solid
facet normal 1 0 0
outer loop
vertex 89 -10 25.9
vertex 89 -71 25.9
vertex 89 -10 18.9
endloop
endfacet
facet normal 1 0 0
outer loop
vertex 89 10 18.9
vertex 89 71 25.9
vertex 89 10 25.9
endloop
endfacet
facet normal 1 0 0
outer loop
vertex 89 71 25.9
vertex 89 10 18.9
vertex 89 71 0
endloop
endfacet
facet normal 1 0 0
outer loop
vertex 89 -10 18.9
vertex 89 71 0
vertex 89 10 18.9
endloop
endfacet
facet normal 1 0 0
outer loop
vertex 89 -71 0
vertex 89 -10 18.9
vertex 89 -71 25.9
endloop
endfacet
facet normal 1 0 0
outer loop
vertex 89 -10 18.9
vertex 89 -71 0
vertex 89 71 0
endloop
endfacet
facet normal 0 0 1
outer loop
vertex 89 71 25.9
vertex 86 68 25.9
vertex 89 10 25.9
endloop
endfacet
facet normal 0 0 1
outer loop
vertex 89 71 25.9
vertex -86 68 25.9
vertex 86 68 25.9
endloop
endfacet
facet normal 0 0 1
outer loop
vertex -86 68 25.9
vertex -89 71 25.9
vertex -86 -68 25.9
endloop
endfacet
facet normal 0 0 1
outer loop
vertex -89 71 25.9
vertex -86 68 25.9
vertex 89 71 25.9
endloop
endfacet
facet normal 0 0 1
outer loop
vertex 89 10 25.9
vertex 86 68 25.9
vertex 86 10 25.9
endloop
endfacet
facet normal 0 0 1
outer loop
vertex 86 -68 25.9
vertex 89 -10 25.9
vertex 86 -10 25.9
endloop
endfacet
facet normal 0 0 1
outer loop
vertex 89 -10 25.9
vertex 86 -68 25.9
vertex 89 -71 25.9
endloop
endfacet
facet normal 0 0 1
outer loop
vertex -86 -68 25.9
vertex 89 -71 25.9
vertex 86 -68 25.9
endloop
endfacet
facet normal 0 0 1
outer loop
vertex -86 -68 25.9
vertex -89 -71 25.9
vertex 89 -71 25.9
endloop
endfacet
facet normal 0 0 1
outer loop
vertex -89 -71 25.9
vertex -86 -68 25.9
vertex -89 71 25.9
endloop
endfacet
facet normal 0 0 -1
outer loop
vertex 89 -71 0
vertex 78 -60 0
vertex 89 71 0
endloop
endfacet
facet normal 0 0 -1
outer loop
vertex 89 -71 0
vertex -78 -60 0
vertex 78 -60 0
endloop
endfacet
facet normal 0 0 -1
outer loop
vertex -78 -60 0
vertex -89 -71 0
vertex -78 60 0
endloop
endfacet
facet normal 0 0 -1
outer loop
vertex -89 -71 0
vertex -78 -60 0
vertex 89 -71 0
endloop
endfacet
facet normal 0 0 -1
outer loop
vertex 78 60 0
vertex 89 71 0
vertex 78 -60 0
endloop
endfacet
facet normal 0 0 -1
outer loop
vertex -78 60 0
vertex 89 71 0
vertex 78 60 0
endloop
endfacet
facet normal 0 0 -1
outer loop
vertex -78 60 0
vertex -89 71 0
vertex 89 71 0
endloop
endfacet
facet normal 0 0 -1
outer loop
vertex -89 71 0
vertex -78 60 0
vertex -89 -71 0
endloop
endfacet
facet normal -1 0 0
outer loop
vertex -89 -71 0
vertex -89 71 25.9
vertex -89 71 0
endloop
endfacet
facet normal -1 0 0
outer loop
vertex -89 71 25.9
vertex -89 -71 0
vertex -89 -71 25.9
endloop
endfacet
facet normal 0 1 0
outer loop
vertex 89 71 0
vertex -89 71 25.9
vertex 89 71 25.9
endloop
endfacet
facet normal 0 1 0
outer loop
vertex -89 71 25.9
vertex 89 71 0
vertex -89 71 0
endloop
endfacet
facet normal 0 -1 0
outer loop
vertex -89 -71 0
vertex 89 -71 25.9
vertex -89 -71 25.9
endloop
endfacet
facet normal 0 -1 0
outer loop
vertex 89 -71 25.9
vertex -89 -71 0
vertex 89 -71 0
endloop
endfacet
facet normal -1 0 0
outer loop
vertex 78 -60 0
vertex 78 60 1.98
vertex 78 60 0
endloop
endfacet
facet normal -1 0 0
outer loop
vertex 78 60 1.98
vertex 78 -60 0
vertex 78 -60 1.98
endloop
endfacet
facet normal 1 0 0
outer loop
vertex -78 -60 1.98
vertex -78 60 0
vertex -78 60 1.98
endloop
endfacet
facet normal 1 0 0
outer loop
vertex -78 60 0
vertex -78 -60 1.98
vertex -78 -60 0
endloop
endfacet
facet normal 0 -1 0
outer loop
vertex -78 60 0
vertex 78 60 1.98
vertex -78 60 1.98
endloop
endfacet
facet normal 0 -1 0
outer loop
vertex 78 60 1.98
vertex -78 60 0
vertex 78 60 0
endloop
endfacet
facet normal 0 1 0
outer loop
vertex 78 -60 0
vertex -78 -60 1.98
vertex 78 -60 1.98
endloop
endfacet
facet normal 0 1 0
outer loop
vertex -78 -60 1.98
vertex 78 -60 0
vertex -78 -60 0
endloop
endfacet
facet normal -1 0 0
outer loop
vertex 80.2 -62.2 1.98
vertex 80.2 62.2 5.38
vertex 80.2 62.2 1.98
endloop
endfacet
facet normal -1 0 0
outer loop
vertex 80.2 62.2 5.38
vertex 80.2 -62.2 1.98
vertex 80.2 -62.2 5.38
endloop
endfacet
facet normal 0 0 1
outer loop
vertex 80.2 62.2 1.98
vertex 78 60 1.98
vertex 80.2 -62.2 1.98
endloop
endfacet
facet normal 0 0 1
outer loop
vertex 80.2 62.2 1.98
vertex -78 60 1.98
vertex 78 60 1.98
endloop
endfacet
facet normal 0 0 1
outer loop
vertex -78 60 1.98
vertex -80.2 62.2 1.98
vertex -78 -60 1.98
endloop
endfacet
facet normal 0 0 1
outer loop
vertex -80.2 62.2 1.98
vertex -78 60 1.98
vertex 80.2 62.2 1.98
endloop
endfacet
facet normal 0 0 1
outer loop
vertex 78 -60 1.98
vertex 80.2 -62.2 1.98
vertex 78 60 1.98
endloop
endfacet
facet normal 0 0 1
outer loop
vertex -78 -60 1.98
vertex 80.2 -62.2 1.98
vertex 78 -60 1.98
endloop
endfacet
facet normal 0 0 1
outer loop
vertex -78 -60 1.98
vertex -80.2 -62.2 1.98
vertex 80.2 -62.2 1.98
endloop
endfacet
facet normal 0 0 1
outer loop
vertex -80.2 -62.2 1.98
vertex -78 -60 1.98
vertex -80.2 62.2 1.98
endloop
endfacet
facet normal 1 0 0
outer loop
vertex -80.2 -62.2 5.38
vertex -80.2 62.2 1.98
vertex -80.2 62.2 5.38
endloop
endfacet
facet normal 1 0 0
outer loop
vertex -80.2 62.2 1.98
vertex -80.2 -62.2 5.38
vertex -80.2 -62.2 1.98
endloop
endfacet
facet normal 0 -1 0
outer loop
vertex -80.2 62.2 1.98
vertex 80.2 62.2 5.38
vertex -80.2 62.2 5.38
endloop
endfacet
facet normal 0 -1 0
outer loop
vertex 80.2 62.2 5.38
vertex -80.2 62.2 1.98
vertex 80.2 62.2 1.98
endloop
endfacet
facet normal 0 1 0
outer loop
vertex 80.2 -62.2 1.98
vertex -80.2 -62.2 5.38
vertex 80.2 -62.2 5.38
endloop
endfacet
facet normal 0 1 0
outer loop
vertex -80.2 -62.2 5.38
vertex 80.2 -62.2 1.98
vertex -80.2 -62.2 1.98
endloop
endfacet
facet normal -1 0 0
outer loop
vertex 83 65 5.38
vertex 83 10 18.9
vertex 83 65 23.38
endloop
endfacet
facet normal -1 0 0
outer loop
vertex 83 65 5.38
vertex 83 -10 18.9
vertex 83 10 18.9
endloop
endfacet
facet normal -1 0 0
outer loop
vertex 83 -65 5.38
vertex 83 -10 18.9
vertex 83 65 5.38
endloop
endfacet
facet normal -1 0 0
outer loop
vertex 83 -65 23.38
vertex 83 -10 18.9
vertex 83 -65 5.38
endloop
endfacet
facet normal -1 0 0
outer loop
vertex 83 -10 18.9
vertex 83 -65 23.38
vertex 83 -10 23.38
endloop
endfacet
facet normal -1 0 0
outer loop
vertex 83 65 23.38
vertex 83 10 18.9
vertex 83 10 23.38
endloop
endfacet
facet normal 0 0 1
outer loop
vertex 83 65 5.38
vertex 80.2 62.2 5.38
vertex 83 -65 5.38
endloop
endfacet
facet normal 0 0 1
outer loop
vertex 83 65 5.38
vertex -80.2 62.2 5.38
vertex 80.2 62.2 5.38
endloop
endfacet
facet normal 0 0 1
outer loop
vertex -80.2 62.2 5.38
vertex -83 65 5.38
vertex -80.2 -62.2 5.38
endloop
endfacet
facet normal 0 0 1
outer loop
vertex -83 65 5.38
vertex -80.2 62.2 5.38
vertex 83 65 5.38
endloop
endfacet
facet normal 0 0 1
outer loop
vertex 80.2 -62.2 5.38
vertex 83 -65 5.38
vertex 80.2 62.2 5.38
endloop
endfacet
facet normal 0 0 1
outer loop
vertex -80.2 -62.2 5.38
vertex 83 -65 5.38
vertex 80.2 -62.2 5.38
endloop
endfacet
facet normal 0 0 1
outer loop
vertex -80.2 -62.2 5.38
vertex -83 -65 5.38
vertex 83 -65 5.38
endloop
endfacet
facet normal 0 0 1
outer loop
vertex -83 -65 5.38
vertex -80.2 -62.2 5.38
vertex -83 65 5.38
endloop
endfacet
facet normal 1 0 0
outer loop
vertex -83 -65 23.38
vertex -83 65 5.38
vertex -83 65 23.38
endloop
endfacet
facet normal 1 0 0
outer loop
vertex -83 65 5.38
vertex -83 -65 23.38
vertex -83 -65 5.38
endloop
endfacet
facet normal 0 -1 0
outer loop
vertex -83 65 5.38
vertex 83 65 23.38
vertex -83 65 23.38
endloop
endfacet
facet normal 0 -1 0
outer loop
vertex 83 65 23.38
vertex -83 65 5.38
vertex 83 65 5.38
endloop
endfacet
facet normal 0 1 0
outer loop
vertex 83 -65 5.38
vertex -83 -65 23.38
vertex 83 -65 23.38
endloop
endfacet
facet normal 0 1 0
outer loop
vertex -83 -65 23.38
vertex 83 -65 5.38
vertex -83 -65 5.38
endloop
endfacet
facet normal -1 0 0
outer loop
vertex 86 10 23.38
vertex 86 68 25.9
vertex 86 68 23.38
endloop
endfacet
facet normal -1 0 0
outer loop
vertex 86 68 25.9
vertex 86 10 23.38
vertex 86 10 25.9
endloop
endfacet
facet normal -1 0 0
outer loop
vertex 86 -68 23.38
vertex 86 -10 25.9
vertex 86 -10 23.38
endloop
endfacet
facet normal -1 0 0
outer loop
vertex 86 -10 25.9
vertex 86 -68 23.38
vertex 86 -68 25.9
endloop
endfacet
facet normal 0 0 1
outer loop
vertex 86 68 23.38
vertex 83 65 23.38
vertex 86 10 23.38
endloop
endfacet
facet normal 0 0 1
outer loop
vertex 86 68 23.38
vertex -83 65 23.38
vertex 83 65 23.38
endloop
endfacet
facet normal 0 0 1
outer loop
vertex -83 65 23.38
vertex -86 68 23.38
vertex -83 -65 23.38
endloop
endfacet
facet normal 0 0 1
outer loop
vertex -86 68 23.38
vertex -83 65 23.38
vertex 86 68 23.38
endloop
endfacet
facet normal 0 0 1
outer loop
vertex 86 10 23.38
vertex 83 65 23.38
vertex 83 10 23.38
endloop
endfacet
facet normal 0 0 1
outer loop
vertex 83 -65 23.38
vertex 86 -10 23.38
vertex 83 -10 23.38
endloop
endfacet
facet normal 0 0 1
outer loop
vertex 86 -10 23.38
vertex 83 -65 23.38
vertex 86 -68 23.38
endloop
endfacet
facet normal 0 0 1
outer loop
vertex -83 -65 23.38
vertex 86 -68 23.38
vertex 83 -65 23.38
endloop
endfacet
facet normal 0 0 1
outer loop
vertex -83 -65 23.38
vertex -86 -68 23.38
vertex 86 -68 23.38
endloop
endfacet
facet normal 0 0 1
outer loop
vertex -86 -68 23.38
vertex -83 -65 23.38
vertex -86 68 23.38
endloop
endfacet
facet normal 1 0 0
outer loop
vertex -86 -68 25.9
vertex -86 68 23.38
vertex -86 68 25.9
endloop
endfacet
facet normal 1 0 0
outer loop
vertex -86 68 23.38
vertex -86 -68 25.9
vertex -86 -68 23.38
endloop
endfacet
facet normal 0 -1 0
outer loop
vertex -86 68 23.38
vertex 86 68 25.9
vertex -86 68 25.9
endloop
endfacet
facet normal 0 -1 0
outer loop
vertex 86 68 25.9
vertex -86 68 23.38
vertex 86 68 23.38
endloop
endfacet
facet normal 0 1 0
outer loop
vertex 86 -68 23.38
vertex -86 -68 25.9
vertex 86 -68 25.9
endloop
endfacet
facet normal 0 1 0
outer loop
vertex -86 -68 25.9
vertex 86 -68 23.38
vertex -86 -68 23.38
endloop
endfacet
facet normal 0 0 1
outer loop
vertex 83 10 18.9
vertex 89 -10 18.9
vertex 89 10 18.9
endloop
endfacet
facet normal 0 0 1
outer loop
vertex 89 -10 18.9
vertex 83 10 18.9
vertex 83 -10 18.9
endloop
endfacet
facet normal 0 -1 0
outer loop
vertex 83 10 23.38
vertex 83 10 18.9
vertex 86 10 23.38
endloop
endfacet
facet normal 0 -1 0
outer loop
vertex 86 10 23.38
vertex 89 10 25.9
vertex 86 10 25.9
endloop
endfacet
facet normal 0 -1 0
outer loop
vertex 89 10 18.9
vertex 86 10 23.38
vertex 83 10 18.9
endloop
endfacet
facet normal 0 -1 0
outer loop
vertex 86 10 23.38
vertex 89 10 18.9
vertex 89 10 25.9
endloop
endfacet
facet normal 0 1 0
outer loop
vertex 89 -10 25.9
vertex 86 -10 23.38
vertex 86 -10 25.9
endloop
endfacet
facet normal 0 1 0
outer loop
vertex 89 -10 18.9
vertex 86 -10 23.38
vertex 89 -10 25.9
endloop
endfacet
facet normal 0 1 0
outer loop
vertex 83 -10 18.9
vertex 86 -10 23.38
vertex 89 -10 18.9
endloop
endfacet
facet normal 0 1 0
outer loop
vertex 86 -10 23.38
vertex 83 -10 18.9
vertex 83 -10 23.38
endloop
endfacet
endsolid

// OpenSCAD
// Caixa paramétrica para litofania 160 x 124 x 3 mm.
// Conceito V5 aprovado; dimensões do LED/USB ainda são provisórias.
// Imprimir body com a frente em Z=0, lid e retainer com a face plana em Z=0.

part = "body"; // body, lid, retainer, assembly
$fn = 48;

// Elementos medidos e dimensões propostas (mm)
litho_w = 160;
litho_h = 124;
litho_t = 3;
outer_w = 178;
outer_h = 142;
front_window_w = 156;
front_window_h = 120;
front_lip_t = 2;
litho_xy_clearance = 0.2; // por lado
litho_z_clearance = 0.4;
inner_w = 166;
inner_h = 130;
rear_seat_w = 172;
rear_seat_h = 136;
rear_seat_depth = 2.5;
rear_lid_xy_clearance = 0.2; // por lado
rear_lid_t = 2.4;
light_gap = 15; // verso da litofania ate face emissora do LED
led_total_thickness = 3; // AJUSTAR apos medir LED + difusor
retainer_t = 1.8;
retainer_xy_clearance = 0.2; // por lado

// A USB-C esta no centro da extremidade curta do PCB, lado direito.
usb_notch_width_y = 20; // AJUSTAR a ficha real
usb_notch_start_x = 76; // relativo ao centro da placa
usb_body_notch_from_back = 7; // AJUSTAR a altura da porta

litho_pocket_w = litho_w + 2*litho_xy_clearance;
litho_pocket_h = litho_h + 2*litho_xy_clearance;
litho_pocket_d = litho_t + litho_z_clearance;
panel_back_z = front_lip_t + litho_pocket_d;
body_depth = panel_back_z + light_gap + led_total_thickness + rear_seat_depth;
seat_start_z = body_depth - rear_seat_depth;
rear_lid_w = rear_seat_w - 2*rear_lid_xy_clearance;
rear_lid_h = rear_seat_h - 2*rear_lid_xy_clearance;
retainer_w = inner_w - 2*retainer_xy_clearance;
retainer_h = inner_h - 2*retainer_xy_clearance;
eps = 0.02;

module body() {
    difference() {
        translate([-outer_w/2, -outer_h/2, 0])
            cube([outer_w, outer_h, body_depth]);
        // Janela frontal: frente impressa sobre o prato.
        translate([-front_window_w/2, -front_window_h/2, -eps])
            cube([front_window_w, front_window_h, front_lip_t+2*eps]);
        // Assento da litofania, inserida pelas costas.
        translate([-litho_pocket_w/2, -litho_pocket_h/2, front_lip_t-eps])
            cube([litho_pocket_w, litho_pocket_h, litho_pocket_d+2*eps]);
        // Camara luminosa com espaco para o aro retentor.
        translate([-inner_w/2, -inner_h/2, panel_back_z-eps])
            cube([inner_w, inner_h, seat_start_z-panel_back_z+2*eps]);
        // Rebaixo posterior: deixa uma aba de apoio de 3 mm.
        translate([-rear_seat_w/2, -rear_seat_h/2, seat_start_z-eps])
            cube([rear_seat_w, rear_seat_h, rear_seat_depth+2*eps]);
        // Alivio no bordo traseiro do corpo para ficha USB exterior.
        translate([inner_w/2-eps, -usb_notch_width_y/2, body_depth-usb_body_notch_from_back])
            cube([outer_w/2-inner_w/2+2*eps, usb_notch_width_y, usb_body_notch_from_back+eps]);
    }
}

module lid() {
    difference() {
        translate([-rear_lid_w/2, -rear_lid_h/2, 0])
            cube([rear_lid_w, rear_lid_h, rear_lid_t]);
        // Rebaixo aberto ate a tomada fixa na extremidade curta do LED.
        translate([usb_notch_start_x, -usb_notch_width_y/2, -eps])
            cube([rear_lid_w/2-usb_notch_start_x+eps, usb_notch_width_y, rear_lid_t+2*eps]);
    }
}

module retainer() {
    difference() {
        translate([-retainer_w/2, -retainer_h/2, 0])
            cube([retainer_w, retainer_h, retainer_t]);
        translate([-front_window_w/2, -front_window_h/2, -eps])
            cube([front_window_w, front_window_h, retainer_t+2*eps]);
    }
}

if (part == "body") body();
else if (part == "lid") lid();
else if (part == "retainer") retainer();
else if (part == "assembly") {
    color("#303d49") body();
    color("#e4d9ba") translate([0,0,front_lip_t+litho_t/2])
        cube([litho_w, litho_h, litho_t], center=true);
    color("#a4b4b8") translate([0,0,panel_back_z]) retainer();
    color("#dbe4e9") translate([0,0,seat_start_z]) lid();
}
